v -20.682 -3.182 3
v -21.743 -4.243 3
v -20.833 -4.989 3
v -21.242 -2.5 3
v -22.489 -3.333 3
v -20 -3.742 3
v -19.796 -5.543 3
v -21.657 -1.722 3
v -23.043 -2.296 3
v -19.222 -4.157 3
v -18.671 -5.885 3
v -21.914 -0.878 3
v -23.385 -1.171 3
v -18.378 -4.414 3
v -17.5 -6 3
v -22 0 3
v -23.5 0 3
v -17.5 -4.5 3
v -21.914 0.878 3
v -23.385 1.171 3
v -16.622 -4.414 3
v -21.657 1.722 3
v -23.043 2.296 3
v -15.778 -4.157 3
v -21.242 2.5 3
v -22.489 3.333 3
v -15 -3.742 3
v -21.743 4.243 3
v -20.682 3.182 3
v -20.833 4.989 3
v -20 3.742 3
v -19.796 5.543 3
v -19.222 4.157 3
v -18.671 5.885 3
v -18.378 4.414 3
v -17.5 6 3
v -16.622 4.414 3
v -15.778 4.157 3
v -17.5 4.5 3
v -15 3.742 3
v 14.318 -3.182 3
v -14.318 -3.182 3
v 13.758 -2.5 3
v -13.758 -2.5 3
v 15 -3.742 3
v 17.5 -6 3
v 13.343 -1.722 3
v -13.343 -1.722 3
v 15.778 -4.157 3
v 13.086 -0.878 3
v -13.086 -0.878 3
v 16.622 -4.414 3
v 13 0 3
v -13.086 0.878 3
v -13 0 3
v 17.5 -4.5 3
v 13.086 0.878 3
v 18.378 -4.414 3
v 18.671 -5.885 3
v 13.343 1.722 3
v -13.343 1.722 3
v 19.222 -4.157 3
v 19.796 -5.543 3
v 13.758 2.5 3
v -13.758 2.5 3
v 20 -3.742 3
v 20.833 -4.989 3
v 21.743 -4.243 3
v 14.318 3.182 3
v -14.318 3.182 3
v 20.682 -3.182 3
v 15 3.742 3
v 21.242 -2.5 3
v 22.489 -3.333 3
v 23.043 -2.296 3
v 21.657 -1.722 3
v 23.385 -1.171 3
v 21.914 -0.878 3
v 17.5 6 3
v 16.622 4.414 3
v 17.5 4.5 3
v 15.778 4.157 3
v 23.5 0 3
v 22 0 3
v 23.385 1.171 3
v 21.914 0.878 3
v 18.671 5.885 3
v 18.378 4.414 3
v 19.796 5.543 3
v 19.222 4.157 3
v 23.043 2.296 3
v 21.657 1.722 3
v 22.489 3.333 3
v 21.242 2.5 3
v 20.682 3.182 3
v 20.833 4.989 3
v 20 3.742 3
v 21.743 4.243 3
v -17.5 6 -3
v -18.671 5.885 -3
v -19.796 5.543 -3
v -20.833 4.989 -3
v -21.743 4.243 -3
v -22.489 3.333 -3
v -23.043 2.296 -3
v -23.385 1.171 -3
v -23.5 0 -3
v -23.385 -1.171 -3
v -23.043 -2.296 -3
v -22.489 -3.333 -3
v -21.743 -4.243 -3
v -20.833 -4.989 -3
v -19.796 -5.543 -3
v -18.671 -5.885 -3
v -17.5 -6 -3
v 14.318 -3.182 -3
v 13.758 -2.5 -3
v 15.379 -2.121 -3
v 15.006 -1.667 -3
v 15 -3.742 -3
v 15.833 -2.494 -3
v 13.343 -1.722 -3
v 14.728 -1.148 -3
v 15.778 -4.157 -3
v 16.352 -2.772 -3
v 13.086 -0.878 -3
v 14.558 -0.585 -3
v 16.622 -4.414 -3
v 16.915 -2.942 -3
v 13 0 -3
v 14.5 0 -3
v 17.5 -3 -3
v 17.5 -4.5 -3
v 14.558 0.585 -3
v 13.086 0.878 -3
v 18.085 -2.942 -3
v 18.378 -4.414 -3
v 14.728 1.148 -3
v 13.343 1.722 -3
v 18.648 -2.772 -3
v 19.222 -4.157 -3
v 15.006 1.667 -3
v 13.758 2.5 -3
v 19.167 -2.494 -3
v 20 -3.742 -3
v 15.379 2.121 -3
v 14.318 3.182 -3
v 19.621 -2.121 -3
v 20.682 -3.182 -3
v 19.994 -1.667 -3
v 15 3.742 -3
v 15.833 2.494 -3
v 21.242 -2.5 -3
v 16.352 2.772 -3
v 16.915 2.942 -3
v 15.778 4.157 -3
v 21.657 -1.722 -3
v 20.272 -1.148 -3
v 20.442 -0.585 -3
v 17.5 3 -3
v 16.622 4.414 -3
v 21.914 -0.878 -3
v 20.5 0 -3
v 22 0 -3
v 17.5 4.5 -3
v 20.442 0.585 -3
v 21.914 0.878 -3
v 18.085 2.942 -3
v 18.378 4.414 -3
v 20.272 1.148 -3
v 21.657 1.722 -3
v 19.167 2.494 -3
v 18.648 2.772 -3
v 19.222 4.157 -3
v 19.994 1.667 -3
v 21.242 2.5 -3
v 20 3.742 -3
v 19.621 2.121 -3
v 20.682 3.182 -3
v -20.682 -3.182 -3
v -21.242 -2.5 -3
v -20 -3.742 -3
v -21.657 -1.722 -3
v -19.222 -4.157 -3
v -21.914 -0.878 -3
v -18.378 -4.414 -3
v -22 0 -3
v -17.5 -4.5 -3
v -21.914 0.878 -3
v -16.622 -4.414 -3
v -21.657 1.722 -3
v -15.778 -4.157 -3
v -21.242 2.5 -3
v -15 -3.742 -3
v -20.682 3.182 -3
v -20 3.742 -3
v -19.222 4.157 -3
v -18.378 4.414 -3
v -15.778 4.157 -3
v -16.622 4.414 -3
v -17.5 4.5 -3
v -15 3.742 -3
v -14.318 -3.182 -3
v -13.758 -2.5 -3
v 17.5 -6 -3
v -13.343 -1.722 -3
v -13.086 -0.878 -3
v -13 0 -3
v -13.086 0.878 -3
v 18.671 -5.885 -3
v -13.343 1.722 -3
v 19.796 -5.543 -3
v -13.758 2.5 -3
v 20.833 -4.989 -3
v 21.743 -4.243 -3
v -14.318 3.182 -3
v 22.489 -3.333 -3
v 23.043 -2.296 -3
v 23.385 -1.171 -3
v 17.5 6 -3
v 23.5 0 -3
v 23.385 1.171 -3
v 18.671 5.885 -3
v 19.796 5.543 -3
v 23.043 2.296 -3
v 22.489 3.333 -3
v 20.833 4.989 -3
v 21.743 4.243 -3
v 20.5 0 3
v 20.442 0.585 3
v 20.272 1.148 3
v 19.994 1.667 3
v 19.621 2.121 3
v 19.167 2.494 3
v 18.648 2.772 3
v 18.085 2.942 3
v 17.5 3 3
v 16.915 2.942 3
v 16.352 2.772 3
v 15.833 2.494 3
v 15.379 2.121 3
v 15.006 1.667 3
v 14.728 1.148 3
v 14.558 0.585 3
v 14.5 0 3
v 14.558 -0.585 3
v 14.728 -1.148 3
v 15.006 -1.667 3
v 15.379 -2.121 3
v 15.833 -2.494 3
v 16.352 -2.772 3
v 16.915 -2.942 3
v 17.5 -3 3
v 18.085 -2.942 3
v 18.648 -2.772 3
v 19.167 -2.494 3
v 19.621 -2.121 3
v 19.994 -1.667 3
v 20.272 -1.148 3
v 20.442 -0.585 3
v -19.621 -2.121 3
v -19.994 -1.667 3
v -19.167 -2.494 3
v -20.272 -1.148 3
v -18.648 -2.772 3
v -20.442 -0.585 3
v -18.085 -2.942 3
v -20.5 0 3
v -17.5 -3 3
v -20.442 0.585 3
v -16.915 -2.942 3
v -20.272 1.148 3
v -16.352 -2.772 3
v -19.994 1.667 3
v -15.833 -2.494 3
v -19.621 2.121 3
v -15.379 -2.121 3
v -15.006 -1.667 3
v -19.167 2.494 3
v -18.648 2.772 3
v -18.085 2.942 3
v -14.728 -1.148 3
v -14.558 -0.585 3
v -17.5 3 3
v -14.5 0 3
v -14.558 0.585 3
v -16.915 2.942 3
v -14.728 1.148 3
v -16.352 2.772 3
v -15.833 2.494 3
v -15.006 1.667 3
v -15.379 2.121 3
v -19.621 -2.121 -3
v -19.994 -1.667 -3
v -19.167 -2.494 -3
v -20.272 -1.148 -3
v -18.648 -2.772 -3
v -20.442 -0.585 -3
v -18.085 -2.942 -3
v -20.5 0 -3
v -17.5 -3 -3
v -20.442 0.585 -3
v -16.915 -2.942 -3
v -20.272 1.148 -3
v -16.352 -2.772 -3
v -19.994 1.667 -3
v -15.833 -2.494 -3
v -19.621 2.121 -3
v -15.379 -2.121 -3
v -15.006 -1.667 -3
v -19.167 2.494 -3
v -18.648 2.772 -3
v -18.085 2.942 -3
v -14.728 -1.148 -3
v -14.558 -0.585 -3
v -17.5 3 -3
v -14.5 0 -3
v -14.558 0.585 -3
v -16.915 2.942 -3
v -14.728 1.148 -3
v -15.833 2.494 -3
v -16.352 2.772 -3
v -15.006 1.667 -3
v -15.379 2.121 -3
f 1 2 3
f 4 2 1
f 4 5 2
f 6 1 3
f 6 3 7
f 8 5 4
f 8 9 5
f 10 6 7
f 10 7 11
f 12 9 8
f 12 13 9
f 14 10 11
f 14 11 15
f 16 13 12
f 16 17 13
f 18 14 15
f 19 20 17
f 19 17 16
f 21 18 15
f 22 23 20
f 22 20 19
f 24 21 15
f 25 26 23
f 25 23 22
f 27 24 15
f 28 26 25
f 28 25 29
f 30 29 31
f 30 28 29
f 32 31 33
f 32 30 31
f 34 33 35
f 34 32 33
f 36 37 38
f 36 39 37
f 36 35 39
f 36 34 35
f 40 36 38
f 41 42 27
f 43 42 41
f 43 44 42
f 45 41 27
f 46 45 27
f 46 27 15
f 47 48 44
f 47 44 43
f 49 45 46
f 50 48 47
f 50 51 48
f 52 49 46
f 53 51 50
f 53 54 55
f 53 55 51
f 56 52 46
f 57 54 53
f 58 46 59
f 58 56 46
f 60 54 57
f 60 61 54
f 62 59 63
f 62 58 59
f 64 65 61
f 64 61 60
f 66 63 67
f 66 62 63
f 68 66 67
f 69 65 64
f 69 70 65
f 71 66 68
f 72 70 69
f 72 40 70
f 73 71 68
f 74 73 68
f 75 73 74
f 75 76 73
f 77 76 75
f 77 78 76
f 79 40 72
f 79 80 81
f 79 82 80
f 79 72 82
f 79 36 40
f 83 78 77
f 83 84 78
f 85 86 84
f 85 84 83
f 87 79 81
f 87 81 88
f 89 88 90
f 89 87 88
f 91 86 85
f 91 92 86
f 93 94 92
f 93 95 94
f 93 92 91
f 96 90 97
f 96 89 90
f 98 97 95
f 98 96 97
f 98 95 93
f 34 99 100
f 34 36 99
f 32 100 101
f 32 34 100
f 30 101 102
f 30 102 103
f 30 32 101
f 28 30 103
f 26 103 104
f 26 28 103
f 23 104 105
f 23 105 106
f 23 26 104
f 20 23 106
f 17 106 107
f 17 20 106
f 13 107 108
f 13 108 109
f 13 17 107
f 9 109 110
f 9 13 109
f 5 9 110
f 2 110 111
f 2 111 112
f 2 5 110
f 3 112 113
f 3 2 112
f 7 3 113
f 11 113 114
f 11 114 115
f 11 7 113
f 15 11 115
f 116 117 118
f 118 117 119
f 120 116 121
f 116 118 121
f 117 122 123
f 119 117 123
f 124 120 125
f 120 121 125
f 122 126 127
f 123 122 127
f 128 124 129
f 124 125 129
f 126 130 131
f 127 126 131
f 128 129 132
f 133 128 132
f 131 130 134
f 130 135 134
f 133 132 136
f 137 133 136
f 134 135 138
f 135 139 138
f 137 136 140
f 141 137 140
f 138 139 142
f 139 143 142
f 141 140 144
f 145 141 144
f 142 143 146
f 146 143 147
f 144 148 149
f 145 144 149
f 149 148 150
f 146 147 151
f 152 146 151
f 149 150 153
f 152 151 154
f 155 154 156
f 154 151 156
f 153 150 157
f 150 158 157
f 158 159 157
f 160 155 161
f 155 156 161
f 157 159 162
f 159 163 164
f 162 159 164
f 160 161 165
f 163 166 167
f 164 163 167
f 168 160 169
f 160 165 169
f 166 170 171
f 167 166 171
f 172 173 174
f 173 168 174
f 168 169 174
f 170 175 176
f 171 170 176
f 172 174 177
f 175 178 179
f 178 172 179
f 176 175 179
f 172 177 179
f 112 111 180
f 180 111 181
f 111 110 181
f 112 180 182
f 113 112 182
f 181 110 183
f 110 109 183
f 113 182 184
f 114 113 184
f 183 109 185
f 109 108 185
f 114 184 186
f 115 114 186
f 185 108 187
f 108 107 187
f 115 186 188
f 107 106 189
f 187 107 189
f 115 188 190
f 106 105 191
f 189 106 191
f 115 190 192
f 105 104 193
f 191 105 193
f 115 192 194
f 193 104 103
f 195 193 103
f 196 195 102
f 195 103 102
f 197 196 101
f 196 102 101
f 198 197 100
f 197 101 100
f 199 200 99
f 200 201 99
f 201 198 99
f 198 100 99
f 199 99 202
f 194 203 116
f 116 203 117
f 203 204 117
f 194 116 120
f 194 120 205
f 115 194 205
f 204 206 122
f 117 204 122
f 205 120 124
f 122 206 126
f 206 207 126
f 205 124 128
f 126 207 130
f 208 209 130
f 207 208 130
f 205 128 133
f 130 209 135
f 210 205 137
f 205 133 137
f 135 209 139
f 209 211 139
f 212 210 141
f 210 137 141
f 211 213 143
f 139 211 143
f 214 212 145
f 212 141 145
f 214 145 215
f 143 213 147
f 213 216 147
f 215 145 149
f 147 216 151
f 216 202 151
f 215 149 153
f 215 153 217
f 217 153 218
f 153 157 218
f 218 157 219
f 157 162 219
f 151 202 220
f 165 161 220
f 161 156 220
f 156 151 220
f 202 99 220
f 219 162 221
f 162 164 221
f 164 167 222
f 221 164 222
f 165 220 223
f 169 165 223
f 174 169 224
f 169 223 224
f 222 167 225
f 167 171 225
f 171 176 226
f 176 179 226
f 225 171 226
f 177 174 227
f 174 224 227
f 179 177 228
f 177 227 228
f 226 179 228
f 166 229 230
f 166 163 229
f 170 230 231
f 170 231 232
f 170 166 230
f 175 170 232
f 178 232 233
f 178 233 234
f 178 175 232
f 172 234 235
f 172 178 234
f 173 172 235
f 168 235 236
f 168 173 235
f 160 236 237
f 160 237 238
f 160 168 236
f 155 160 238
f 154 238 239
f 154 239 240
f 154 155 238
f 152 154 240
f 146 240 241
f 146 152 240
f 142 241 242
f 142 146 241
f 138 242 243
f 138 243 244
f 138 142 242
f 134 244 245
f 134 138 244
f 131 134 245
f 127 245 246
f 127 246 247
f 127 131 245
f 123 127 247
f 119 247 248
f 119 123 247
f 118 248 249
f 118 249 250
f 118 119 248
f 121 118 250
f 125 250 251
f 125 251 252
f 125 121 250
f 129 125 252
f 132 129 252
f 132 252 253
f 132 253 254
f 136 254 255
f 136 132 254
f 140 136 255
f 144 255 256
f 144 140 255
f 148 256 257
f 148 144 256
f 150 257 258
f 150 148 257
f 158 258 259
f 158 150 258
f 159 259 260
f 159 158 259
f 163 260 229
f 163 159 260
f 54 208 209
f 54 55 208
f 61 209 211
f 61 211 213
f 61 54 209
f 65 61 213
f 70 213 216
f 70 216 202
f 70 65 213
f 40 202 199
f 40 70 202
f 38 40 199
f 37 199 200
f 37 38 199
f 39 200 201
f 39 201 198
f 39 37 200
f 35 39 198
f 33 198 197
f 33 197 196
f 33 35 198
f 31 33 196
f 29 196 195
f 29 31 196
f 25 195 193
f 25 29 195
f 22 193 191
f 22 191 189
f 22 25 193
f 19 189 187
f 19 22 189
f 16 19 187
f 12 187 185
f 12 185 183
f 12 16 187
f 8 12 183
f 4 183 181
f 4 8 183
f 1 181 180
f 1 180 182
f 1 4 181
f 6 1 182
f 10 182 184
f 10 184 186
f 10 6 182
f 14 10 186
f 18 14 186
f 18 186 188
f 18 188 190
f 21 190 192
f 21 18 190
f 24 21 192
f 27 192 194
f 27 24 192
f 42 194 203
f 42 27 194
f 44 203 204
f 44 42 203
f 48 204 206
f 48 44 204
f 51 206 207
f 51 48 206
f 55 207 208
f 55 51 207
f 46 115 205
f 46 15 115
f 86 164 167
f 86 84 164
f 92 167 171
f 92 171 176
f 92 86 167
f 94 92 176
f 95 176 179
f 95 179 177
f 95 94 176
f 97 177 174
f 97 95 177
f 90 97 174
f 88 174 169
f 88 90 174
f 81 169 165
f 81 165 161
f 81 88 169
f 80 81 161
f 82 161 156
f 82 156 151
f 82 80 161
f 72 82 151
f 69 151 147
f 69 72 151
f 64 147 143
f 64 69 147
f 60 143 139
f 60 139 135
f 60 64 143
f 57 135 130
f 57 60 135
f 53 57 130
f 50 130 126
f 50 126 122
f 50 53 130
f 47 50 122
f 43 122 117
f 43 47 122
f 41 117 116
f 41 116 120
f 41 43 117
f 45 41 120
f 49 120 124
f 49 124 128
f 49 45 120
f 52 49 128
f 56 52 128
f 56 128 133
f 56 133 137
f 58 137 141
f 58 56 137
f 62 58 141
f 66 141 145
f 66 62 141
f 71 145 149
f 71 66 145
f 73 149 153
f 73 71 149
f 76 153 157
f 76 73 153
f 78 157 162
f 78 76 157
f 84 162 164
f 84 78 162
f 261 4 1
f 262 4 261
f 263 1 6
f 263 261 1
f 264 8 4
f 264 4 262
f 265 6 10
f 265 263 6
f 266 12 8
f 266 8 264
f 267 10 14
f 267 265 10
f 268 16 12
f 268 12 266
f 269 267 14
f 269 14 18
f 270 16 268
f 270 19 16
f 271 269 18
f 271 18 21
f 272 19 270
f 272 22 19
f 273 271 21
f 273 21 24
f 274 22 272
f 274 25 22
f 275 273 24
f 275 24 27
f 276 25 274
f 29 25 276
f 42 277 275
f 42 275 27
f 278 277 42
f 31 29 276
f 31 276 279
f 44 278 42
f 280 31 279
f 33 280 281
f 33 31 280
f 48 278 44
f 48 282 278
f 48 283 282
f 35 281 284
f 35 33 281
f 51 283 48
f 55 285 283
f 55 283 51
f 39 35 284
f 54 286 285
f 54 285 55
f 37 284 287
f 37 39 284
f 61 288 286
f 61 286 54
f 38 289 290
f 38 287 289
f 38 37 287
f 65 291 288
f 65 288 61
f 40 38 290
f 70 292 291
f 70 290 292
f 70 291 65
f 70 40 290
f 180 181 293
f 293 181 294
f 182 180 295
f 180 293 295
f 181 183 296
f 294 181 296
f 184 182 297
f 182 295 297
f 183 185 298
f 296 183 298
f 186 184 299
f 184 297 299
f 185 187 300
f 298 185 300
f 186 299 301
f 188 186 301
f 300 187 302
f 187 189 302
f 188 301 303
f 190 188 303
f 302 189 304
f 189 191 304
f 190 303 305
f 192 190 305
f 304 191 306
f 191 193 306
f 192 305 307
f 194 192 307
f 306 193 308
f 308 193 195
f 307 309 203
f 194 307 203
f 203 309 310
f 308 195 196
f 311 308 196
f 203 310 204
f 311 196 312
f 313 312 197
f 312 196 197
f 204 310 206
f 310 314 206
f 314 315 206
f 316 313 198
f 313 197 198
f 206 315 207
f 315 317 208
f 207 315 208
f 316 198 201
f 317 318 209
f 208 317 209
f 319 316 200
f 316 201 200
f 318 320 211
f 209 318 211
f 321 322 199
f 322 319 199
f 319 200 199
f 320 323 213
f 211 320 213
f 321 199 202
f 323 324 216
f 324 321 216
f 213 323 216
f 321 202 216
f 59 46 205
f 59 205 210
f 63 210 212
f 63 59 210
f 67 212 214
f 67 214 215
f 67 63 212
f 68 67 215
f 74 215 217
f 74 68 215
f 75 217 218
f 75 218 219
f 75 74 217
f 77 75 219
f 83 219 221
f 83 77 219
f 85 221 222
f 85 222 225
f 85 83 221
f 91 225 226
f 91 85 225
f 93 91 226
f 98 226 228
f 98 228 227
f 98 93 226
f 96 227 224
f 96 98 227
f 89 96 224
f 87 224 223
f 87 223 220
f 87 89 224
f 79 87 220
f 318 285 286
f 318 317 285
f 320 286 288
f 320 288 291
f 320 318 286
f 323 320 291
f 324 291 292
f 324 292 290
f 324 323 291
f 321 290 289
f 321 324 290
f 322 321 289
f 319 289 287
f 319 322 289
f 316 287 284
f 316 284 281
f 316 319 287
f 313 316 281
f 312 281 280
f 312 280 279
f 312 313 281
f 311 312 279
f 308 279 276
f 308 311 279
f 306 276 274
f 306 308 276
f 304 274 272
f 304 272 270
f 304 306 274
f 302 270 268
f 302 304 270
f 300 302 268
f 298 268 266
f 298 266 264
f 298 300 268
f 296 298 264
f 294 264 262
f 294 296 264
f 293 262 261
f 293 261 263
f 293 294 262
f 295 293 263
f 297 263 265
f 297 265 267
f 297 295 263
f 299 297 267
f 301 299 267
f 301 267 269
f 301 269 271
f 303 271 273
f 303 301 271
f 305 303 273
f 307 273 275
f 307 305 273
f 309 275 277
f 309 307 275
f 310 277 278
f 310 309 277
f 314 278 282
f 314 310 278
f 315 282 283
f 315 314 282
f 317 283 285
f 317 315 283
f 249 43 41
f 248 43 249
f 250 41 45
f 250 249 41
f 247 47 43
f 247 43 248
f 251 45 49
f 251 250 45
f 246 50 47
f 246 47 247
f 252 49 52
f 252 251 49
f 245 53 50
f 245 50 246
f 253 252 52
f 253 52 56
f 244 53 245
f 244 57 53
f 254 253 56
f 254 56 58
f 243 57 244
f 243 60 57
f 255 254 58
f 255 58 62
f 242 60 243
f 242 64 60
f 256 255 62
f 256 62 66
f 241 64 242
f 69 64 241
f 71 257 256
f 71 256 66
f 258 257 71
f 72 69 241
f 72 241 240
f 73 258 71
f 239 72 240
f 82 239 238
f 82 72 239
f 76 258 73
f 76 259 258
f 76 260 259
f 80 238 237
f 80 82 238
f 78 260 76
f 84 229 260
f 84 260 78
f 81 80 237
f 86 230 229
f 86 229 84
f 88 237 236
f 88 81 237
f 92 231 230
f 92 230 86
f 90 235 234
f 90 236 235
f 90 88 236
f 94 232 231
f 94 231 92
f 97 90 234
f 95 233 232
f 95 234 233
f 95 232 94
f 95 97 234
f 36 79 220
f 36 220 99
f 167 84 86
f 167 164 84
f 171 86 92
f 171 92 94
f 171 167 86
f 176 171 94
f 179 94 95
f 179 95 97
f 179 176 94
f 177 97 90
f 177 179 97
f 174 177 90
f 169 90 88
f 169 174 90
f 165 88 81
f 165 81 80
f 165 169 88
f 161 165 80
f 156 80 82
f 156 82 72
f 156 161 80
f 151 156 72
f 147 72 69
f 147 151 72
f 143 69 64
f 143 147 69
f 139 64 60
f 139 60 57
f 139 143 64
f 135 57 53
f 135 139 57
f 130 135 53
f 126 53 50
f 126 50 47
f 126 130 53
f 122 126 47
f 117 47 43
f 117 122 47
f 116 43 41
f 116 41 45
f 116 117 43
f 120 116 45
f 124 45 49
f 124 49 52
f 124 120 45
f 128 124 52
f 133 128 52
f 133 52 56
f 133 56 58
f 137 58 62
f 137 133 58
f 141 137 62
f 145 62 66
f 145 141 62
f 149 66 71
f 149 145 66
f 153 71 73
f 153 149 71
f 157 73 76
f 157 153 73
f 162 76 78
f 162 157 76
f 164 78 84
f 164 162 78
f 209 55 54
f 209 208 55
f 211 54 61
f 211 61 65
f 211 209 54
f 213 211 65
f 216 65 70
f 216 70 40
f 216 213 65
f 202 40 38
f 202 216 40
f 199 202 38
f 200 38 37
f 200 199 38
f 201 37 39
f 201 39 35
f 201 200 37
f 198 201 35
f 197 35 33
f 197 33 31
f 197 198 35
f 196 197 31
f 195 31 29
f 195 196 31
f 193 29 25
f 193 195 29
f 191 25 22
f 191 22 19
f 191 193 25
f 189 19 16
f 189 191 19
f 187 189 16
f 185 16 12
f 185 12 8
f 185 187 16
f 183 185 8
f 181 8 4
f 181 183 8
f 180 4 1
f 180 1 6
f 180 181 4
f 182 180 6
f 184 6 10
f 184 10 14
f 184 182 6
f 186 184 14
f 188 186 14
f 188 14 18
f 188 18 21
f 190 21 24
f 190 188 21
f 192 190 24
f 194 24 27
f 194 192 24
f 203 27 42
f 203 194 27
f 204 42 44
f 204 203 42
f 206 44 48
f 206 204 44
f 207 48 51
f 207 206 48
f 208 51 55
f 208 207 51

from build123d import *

# Parameters (mm, degrees)
SKETCH1_R             = 4.5
BOSS_EXTRUDE1_DEPTH   = 3
SKETCH1_3_R           = 4.5
SKETCH1_3_R_2         = 3
BOSS_EXTRUDE2_DEPTH   = 3
BOSS_EXTRUDE2_2_DEPTH = 3


with BuildPart() as part:
    # Sketch1 → Boss-Extrude1 (new, symmetric)
    with BuildSketch(Plane.XY):
        with BuildLine():
            Line((-17.5, -6), (17.5, -6))
            ThreePointArc((17.5, -6), (23.5, 0), (17.5, 6))
            Line((17.5, 6), (-17.5, 6))
            ThreePointArc((-17.5, 6), (-23.5, 0), (-17.5, -6))
        make_face()
        with Locations((-17.5, 0)):
            Circle(SKETCH1_R, mode=Mode.SUBTRACT)
        with Locations((17.5, 0)):
            Circle(SKETCH1_R, mode=Mode.SUBTRACT)
    extrude(amount=BOSS_EXTRUDE1_DEPTH, both=True)


with BuildPart() as body_2:
    # Sketch1<3> → Boss-Extrude2 (new, symmetric)
    with BuildSketch(Plane.XY):
        with Locations((-17.5, 0)):
            Circle(SKETCH1_3_R)
        with Locations((-17.5, 0)):
            Circle(SKETCH1_3_R_2, mode=Mode.SUBTRACT)
    extrude(amount=BOSS_EXTRUDE2_DEPTH, both=True)


with BuildPart() as body_3:
    # Sketch1<3> → Boss-Extrude2 2 (new, symmetric)
    with BuildSketch(Plane.XY):
        with Locations((17.5, 0)):
            Circle(SKETCH1_3_R)
        with Locations((17.5, 0)):
            Circle(SKETCH1_3_R_2, mode=Mode.SUBTRACT)
    extrude(amount=BOSS_EXTRUDE2_2_DEPTH, both=True)


solid = Compound([part.part, body_2.part, body_3.part])
